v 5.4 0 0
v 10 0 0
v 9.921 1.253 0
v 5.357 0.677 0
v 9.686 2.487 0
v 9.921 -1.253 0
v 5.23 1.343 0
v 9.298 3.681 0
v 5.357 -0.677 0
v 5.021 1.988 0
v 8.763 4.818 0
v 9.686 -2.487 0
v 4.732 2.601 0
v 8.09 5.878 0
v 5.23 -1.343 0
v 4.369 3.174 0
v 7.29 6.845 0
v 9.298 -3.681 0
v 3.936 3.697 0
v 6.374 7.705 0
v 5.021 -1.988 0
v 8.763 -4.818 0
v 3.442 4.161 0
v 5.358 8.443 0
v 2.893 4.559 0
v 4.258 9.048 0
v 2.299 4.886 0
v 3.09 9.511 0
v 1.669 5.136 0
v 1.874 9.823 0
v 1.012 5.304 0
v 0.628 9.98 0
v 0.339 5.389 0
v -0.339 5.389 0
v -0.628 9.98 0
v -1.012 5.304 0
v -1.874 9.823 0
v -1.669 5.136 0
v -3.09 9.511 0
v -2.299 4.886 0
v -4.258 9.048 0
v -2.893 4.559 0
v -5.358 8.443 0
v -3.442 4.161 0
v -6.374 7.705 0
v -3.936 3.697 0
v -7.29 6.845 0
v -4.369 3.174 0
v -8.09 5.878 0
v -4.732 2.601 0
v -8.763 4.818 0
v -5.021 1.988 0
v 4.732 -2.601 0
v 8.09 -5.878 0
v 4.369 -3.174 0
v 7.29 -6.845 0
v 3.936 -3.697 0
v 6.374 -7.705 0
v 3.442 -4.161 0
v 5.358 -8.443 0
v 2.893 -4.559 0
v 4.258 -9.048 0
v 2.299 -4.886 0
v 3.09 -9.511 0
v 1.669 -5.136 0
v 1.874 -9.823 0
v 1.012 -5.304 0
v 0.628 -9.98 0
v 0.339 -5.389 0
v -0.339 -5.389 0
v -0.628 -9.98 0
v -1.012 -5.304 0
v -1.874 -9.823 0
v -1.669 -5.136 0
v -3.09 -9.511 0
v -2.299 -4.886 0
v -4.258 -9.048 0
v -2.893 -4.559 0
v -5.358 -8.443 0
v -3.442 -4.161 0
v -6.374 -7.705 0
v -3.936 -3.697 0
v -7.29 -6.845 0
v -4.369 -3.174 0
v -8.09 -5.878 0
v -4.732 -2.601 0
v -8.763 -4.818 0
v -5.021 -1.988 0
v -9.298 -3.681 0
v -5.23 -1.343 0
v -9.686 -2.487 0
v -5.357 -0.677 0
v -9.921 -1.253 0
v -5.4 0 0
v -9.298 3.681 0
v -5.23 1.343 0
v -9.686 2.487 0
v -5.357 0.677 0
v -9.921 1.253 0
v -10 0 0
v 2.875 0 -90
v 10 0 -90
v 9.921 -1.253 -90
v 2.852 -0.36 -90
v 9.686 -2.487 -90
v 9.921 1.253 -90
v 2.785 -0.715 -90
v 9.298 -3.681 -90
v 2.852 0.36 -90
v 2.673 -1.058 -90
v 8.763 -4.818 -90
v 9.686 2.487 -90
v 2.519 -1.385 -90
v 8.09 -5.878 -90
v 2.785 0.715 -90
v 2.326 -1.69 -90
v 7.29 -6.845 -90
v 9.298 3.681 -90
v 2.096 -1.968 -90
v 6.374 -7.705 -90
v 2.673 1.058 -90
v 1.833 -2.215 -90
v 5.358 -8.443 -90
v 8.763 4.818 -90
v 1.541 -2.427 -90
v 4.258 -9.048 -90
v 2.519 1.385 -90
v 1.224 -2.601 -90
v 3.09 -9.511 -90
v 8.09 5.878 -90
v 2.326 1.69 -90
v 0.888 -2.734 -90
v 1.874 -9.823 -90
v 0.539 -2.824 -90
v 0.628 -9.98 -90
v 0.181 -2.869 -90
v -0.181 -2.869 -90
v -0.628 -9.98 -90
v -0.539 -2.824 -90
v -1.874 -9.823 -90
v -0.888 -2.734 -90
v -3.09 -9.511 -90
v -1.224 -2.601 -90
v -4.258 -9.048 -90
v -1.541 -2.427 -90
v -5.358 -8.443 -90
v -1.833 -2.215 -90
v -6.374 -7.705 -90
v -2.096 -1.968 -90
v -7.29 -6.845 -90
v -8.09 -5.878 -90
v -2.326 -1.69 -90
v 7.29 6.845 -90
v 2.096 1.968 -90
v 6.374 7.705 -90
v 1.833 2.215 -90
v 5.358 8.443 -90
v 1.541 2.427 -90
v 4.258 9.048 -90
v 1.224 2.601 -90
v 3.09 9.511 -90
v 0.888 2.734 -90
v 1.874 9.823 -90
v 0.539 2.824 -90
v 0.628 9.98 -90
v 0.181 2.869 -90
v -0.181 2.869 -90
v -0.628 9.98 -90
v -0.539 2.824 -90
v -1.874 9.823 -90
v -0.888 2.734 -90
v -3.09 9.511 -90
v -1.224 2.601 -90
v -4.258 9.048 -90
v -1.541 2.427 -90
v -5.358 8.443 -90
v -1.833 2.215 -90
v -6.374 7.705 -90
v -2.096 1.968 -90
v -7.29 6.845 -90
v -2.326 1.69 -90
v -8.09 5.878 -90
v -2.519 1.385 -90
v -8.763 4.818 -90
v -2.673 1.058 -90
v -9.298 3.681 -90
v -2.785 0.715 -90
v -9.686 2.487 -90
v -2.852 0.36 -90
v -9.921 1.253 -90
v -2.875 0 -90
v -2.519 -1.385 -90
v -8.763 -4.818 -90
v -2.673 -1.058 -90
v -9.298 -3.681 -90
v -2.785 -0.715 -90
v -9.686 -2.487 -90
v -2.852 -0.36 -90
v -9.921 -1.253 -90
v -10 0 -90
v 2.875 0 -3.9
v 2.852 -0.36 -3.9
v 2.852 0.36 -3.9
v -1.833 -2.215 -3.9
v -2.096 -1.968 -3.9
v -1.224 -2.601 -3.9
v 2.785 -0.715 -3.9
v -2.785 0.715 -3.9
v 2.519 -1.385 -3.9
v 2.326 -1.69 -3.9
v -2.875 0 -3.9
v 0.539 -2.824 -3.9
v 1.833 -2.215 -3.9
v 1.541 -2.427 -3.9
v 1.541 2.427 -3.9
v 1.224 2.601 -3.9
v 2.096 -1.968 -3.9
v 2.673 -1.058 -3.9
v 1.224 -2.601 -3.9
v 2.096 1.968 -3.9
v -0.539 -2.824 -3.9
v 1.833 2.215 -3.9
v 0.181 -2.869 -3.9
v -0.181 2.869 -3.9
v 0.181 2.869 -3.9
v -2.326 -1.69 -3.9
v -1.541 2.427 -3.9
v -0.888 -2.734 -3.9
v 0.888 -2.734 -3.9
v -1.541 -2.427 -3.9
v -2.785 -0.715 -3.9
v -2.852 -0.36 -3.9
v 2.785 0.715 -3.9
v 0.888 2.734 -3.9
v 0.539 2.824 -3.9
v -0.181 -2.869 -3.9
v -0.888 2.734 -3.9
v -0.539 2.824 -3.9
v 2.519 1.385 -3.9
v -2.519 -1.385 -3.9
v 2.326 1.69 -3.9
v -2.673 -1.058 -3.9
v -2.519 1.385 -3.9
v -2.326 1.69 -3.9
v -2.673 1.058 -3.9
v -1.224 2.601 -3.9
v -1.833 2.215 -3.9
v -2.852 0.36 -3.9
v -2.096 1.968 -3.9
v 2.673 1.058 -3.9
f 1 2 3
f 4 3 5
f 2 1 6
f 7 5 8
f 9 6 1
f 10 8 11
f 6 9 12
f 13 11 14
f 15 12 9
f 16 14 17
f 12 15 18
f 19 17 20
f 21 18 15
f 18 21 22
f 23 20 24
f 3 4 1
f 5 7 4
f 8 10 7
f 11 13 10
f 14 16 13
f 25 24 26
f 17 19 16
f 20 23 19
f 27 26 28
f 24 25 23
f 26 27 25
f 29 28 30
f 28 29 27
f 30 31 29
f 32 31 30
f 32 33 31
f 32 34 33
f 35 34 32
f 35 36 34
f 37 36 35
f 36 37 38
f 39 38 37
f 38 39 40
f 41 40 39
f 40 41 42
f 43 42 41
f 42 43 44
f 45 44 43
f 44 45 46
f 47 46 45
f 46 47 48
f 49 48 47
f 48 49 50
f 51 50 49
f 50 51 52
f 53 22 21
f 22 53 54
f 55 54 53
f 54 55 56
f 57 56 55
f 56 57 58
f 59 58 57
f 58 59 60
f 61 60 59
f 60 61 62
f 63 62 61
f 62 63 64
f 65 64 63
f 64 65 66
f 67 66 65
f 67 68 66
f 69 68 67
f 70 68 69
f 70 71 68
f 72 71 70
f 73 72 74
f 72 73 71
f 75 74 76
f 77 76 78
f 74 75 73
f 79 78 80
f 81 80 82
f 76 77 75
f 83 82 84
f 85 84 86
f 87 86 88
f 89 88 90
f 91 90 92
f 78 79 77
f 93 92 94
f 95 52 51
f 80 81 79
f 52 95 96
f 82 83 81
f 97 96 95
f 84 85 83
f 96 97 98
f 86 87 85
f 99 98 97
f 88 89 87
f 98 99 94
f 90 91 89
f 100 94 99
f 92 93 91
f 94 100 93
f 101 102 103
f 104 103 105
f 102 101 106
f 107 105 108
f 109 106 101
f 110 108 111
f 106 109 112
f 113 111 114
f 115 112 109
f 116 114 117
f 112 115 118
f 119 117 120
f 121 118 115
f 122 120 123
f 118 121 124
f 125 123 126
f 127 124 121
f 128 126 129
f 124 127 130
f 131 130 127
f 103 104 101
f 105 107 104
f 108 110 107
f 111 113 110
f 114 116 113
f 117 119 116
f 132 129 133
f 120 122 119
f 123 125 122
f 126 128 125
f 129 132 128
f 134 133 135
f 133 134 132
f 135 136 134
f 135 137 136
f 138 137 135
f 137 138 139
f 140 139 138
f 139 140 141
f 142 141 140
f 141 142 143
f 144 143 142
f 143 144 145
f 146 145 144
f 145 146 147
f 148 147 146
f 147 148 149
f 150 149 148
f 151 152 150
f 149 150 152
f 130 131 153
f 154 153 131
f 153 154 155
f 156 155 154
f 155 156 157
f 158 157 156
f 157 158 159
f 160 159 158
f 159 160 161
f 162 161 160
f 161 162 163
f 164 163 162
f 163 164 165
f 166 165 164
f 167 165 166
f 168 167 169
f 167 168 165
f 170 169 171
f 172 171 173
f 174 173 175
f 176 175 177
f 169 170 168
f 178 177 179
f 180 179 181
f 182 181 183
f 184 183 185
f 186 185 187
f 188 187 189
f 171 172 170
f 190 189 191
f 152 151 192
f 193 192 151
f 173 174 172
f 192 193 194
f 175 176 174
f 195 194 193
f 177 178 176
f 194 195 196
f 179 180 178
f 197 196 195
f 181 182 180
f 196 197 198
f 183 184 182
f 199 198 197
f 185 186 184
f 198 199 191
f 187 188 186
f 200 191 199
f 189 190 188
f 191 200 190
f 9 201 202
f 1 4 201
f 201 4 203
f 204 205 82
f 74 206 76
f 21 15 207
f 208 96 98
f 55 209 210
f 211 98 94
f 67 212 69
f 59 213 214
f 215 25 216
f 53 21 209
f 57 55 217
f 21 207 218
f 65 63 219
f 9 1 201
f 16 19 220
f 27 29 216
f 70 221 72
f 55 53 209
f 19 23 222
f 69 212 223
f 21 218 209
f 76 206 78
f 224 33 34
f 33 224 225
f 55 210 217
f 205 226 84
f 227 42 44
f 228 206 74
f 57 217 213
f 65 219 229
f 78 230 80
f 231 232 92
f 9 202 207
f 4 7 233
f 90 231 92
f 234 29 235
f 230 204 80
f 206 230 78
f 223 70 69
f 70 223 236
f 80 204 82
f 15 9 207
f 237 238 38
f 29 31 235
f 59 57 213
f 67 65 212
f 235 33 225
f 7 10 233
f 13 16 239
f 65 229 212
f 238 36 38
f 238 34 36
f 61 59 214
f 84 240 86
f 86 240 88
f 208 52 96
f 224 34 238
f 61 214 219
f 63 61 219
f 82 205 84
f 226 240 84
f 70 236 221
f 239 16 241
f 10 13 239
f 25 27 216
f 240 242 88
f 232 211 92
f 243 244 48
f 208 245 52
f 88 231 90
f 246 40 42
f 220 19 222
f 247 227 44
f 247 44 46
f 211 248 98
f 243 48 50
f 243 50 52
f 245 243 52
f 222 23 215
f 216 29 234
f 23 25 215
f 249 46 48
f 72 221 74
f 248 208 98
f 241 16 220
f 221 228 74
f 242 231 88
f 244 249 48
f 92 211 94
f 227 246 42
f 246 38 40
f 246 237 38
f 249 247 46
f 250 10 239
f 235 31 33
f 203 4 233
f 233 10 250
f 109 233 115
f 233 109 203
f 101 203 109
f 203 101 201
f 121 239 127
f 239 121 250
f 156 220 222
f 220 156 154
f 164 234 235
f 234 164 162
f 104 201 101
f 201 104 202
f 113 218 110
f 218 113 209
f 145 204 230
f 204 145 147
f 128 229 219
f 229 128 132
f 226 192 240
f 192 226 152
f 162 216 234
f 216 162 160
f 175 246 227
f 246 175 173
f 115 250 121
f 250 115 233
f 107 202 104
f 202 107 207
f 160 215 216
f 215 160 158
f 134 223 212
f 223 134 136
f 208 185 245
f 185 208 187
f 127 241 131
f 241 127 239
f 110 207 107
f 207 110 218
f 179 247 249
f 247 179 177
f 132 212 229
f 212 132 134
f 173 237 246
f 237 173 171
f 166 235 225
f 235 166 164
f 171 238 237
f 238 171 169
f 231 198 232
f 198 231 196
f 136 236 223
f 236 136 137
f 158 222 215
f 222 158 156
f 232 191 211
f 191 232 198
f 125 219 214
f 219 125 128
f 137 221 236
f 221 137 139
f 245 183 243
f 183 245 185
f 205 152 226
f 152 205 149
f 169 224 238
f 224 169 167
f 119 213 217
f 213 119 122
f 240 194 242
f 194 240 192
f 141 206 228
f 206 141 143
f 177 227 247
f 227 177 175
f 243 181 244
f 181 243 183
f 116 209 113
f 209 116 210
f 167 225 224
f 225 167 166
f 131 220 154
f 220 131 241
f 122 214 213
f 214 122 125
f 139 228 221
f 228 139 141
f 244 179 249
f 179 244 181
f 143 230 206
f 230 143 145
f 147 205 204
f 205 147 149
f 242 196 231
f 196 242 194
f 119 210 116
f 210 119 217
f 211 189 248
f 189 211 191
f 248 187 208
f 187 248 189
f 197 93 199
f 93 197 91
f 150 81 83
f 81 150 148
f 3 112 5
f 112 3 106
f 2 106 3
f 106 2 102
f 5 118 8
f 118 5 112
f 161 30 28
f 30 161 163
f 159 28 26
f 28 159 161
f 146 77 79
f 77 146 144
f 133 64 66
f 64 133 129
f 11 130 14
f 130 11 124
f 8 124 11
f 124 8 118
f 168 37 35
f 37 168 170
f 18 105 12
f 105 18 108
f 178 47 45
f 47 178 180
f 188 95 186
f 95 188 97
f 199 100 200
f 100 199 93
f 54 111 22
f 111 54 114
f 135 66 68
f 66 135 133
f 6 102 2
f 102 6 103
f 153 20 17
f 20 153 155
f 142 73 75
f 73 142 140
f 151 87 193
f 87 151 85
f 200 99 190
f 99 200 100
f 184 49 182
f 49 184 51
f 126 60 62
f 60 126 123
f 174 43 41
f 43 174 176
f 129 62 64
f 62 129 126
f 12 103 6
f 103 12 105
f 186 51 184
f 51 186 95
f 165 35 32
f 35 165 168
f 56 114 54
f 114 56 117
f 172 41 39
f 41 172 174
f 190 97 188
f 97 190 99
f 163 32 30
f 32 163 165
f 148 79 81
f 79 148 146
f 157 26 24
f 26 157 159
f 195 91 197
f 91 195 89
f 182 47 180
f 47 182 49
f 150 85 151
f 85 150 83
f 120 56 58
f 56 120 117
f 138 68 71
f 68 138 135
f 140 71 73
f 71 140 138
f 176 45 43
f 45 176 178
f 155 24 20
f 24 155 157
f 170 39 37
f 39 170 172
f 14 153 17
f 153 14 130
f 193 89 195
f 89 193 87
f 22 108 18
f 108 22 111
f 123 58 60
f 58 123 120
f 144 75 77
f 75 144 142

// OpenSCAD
$fn = 50;


difference() {
	union() {
		translate(v = [0, 0, -90.0000000000]) {
			cylinder(h = 90, r = 10.0000000000);
		}
		cylinder(h = 0, r = 20.0000000000);
	}
	union() {
		translate(v = [0, 0, 0]) {
			rotate(a = [0, 0, 0]) {
				difference() {
					union() {
						#translate(v = [0, 0, -90.0000000000]) {
							cylinder(h = 90, r = 2.6000000000);
						}
						#translate(v = [0, 0, -3.9000000000]) {
							cylinder(h = 3.9000000000, r1 = 2.8750000000, r2 = 5.4000000000);
						}
						#translate(v = [0, 0, -90.0000000000]) {
							cylinder(h = 90, r = 2.8750000000);
						}
						#translate(v = [0, 0, -90.0000000000]) {
							cylinder(h = 90, r = 2.6000000000);
						}
					}
					union();
				}
			}
		}
	}
}
